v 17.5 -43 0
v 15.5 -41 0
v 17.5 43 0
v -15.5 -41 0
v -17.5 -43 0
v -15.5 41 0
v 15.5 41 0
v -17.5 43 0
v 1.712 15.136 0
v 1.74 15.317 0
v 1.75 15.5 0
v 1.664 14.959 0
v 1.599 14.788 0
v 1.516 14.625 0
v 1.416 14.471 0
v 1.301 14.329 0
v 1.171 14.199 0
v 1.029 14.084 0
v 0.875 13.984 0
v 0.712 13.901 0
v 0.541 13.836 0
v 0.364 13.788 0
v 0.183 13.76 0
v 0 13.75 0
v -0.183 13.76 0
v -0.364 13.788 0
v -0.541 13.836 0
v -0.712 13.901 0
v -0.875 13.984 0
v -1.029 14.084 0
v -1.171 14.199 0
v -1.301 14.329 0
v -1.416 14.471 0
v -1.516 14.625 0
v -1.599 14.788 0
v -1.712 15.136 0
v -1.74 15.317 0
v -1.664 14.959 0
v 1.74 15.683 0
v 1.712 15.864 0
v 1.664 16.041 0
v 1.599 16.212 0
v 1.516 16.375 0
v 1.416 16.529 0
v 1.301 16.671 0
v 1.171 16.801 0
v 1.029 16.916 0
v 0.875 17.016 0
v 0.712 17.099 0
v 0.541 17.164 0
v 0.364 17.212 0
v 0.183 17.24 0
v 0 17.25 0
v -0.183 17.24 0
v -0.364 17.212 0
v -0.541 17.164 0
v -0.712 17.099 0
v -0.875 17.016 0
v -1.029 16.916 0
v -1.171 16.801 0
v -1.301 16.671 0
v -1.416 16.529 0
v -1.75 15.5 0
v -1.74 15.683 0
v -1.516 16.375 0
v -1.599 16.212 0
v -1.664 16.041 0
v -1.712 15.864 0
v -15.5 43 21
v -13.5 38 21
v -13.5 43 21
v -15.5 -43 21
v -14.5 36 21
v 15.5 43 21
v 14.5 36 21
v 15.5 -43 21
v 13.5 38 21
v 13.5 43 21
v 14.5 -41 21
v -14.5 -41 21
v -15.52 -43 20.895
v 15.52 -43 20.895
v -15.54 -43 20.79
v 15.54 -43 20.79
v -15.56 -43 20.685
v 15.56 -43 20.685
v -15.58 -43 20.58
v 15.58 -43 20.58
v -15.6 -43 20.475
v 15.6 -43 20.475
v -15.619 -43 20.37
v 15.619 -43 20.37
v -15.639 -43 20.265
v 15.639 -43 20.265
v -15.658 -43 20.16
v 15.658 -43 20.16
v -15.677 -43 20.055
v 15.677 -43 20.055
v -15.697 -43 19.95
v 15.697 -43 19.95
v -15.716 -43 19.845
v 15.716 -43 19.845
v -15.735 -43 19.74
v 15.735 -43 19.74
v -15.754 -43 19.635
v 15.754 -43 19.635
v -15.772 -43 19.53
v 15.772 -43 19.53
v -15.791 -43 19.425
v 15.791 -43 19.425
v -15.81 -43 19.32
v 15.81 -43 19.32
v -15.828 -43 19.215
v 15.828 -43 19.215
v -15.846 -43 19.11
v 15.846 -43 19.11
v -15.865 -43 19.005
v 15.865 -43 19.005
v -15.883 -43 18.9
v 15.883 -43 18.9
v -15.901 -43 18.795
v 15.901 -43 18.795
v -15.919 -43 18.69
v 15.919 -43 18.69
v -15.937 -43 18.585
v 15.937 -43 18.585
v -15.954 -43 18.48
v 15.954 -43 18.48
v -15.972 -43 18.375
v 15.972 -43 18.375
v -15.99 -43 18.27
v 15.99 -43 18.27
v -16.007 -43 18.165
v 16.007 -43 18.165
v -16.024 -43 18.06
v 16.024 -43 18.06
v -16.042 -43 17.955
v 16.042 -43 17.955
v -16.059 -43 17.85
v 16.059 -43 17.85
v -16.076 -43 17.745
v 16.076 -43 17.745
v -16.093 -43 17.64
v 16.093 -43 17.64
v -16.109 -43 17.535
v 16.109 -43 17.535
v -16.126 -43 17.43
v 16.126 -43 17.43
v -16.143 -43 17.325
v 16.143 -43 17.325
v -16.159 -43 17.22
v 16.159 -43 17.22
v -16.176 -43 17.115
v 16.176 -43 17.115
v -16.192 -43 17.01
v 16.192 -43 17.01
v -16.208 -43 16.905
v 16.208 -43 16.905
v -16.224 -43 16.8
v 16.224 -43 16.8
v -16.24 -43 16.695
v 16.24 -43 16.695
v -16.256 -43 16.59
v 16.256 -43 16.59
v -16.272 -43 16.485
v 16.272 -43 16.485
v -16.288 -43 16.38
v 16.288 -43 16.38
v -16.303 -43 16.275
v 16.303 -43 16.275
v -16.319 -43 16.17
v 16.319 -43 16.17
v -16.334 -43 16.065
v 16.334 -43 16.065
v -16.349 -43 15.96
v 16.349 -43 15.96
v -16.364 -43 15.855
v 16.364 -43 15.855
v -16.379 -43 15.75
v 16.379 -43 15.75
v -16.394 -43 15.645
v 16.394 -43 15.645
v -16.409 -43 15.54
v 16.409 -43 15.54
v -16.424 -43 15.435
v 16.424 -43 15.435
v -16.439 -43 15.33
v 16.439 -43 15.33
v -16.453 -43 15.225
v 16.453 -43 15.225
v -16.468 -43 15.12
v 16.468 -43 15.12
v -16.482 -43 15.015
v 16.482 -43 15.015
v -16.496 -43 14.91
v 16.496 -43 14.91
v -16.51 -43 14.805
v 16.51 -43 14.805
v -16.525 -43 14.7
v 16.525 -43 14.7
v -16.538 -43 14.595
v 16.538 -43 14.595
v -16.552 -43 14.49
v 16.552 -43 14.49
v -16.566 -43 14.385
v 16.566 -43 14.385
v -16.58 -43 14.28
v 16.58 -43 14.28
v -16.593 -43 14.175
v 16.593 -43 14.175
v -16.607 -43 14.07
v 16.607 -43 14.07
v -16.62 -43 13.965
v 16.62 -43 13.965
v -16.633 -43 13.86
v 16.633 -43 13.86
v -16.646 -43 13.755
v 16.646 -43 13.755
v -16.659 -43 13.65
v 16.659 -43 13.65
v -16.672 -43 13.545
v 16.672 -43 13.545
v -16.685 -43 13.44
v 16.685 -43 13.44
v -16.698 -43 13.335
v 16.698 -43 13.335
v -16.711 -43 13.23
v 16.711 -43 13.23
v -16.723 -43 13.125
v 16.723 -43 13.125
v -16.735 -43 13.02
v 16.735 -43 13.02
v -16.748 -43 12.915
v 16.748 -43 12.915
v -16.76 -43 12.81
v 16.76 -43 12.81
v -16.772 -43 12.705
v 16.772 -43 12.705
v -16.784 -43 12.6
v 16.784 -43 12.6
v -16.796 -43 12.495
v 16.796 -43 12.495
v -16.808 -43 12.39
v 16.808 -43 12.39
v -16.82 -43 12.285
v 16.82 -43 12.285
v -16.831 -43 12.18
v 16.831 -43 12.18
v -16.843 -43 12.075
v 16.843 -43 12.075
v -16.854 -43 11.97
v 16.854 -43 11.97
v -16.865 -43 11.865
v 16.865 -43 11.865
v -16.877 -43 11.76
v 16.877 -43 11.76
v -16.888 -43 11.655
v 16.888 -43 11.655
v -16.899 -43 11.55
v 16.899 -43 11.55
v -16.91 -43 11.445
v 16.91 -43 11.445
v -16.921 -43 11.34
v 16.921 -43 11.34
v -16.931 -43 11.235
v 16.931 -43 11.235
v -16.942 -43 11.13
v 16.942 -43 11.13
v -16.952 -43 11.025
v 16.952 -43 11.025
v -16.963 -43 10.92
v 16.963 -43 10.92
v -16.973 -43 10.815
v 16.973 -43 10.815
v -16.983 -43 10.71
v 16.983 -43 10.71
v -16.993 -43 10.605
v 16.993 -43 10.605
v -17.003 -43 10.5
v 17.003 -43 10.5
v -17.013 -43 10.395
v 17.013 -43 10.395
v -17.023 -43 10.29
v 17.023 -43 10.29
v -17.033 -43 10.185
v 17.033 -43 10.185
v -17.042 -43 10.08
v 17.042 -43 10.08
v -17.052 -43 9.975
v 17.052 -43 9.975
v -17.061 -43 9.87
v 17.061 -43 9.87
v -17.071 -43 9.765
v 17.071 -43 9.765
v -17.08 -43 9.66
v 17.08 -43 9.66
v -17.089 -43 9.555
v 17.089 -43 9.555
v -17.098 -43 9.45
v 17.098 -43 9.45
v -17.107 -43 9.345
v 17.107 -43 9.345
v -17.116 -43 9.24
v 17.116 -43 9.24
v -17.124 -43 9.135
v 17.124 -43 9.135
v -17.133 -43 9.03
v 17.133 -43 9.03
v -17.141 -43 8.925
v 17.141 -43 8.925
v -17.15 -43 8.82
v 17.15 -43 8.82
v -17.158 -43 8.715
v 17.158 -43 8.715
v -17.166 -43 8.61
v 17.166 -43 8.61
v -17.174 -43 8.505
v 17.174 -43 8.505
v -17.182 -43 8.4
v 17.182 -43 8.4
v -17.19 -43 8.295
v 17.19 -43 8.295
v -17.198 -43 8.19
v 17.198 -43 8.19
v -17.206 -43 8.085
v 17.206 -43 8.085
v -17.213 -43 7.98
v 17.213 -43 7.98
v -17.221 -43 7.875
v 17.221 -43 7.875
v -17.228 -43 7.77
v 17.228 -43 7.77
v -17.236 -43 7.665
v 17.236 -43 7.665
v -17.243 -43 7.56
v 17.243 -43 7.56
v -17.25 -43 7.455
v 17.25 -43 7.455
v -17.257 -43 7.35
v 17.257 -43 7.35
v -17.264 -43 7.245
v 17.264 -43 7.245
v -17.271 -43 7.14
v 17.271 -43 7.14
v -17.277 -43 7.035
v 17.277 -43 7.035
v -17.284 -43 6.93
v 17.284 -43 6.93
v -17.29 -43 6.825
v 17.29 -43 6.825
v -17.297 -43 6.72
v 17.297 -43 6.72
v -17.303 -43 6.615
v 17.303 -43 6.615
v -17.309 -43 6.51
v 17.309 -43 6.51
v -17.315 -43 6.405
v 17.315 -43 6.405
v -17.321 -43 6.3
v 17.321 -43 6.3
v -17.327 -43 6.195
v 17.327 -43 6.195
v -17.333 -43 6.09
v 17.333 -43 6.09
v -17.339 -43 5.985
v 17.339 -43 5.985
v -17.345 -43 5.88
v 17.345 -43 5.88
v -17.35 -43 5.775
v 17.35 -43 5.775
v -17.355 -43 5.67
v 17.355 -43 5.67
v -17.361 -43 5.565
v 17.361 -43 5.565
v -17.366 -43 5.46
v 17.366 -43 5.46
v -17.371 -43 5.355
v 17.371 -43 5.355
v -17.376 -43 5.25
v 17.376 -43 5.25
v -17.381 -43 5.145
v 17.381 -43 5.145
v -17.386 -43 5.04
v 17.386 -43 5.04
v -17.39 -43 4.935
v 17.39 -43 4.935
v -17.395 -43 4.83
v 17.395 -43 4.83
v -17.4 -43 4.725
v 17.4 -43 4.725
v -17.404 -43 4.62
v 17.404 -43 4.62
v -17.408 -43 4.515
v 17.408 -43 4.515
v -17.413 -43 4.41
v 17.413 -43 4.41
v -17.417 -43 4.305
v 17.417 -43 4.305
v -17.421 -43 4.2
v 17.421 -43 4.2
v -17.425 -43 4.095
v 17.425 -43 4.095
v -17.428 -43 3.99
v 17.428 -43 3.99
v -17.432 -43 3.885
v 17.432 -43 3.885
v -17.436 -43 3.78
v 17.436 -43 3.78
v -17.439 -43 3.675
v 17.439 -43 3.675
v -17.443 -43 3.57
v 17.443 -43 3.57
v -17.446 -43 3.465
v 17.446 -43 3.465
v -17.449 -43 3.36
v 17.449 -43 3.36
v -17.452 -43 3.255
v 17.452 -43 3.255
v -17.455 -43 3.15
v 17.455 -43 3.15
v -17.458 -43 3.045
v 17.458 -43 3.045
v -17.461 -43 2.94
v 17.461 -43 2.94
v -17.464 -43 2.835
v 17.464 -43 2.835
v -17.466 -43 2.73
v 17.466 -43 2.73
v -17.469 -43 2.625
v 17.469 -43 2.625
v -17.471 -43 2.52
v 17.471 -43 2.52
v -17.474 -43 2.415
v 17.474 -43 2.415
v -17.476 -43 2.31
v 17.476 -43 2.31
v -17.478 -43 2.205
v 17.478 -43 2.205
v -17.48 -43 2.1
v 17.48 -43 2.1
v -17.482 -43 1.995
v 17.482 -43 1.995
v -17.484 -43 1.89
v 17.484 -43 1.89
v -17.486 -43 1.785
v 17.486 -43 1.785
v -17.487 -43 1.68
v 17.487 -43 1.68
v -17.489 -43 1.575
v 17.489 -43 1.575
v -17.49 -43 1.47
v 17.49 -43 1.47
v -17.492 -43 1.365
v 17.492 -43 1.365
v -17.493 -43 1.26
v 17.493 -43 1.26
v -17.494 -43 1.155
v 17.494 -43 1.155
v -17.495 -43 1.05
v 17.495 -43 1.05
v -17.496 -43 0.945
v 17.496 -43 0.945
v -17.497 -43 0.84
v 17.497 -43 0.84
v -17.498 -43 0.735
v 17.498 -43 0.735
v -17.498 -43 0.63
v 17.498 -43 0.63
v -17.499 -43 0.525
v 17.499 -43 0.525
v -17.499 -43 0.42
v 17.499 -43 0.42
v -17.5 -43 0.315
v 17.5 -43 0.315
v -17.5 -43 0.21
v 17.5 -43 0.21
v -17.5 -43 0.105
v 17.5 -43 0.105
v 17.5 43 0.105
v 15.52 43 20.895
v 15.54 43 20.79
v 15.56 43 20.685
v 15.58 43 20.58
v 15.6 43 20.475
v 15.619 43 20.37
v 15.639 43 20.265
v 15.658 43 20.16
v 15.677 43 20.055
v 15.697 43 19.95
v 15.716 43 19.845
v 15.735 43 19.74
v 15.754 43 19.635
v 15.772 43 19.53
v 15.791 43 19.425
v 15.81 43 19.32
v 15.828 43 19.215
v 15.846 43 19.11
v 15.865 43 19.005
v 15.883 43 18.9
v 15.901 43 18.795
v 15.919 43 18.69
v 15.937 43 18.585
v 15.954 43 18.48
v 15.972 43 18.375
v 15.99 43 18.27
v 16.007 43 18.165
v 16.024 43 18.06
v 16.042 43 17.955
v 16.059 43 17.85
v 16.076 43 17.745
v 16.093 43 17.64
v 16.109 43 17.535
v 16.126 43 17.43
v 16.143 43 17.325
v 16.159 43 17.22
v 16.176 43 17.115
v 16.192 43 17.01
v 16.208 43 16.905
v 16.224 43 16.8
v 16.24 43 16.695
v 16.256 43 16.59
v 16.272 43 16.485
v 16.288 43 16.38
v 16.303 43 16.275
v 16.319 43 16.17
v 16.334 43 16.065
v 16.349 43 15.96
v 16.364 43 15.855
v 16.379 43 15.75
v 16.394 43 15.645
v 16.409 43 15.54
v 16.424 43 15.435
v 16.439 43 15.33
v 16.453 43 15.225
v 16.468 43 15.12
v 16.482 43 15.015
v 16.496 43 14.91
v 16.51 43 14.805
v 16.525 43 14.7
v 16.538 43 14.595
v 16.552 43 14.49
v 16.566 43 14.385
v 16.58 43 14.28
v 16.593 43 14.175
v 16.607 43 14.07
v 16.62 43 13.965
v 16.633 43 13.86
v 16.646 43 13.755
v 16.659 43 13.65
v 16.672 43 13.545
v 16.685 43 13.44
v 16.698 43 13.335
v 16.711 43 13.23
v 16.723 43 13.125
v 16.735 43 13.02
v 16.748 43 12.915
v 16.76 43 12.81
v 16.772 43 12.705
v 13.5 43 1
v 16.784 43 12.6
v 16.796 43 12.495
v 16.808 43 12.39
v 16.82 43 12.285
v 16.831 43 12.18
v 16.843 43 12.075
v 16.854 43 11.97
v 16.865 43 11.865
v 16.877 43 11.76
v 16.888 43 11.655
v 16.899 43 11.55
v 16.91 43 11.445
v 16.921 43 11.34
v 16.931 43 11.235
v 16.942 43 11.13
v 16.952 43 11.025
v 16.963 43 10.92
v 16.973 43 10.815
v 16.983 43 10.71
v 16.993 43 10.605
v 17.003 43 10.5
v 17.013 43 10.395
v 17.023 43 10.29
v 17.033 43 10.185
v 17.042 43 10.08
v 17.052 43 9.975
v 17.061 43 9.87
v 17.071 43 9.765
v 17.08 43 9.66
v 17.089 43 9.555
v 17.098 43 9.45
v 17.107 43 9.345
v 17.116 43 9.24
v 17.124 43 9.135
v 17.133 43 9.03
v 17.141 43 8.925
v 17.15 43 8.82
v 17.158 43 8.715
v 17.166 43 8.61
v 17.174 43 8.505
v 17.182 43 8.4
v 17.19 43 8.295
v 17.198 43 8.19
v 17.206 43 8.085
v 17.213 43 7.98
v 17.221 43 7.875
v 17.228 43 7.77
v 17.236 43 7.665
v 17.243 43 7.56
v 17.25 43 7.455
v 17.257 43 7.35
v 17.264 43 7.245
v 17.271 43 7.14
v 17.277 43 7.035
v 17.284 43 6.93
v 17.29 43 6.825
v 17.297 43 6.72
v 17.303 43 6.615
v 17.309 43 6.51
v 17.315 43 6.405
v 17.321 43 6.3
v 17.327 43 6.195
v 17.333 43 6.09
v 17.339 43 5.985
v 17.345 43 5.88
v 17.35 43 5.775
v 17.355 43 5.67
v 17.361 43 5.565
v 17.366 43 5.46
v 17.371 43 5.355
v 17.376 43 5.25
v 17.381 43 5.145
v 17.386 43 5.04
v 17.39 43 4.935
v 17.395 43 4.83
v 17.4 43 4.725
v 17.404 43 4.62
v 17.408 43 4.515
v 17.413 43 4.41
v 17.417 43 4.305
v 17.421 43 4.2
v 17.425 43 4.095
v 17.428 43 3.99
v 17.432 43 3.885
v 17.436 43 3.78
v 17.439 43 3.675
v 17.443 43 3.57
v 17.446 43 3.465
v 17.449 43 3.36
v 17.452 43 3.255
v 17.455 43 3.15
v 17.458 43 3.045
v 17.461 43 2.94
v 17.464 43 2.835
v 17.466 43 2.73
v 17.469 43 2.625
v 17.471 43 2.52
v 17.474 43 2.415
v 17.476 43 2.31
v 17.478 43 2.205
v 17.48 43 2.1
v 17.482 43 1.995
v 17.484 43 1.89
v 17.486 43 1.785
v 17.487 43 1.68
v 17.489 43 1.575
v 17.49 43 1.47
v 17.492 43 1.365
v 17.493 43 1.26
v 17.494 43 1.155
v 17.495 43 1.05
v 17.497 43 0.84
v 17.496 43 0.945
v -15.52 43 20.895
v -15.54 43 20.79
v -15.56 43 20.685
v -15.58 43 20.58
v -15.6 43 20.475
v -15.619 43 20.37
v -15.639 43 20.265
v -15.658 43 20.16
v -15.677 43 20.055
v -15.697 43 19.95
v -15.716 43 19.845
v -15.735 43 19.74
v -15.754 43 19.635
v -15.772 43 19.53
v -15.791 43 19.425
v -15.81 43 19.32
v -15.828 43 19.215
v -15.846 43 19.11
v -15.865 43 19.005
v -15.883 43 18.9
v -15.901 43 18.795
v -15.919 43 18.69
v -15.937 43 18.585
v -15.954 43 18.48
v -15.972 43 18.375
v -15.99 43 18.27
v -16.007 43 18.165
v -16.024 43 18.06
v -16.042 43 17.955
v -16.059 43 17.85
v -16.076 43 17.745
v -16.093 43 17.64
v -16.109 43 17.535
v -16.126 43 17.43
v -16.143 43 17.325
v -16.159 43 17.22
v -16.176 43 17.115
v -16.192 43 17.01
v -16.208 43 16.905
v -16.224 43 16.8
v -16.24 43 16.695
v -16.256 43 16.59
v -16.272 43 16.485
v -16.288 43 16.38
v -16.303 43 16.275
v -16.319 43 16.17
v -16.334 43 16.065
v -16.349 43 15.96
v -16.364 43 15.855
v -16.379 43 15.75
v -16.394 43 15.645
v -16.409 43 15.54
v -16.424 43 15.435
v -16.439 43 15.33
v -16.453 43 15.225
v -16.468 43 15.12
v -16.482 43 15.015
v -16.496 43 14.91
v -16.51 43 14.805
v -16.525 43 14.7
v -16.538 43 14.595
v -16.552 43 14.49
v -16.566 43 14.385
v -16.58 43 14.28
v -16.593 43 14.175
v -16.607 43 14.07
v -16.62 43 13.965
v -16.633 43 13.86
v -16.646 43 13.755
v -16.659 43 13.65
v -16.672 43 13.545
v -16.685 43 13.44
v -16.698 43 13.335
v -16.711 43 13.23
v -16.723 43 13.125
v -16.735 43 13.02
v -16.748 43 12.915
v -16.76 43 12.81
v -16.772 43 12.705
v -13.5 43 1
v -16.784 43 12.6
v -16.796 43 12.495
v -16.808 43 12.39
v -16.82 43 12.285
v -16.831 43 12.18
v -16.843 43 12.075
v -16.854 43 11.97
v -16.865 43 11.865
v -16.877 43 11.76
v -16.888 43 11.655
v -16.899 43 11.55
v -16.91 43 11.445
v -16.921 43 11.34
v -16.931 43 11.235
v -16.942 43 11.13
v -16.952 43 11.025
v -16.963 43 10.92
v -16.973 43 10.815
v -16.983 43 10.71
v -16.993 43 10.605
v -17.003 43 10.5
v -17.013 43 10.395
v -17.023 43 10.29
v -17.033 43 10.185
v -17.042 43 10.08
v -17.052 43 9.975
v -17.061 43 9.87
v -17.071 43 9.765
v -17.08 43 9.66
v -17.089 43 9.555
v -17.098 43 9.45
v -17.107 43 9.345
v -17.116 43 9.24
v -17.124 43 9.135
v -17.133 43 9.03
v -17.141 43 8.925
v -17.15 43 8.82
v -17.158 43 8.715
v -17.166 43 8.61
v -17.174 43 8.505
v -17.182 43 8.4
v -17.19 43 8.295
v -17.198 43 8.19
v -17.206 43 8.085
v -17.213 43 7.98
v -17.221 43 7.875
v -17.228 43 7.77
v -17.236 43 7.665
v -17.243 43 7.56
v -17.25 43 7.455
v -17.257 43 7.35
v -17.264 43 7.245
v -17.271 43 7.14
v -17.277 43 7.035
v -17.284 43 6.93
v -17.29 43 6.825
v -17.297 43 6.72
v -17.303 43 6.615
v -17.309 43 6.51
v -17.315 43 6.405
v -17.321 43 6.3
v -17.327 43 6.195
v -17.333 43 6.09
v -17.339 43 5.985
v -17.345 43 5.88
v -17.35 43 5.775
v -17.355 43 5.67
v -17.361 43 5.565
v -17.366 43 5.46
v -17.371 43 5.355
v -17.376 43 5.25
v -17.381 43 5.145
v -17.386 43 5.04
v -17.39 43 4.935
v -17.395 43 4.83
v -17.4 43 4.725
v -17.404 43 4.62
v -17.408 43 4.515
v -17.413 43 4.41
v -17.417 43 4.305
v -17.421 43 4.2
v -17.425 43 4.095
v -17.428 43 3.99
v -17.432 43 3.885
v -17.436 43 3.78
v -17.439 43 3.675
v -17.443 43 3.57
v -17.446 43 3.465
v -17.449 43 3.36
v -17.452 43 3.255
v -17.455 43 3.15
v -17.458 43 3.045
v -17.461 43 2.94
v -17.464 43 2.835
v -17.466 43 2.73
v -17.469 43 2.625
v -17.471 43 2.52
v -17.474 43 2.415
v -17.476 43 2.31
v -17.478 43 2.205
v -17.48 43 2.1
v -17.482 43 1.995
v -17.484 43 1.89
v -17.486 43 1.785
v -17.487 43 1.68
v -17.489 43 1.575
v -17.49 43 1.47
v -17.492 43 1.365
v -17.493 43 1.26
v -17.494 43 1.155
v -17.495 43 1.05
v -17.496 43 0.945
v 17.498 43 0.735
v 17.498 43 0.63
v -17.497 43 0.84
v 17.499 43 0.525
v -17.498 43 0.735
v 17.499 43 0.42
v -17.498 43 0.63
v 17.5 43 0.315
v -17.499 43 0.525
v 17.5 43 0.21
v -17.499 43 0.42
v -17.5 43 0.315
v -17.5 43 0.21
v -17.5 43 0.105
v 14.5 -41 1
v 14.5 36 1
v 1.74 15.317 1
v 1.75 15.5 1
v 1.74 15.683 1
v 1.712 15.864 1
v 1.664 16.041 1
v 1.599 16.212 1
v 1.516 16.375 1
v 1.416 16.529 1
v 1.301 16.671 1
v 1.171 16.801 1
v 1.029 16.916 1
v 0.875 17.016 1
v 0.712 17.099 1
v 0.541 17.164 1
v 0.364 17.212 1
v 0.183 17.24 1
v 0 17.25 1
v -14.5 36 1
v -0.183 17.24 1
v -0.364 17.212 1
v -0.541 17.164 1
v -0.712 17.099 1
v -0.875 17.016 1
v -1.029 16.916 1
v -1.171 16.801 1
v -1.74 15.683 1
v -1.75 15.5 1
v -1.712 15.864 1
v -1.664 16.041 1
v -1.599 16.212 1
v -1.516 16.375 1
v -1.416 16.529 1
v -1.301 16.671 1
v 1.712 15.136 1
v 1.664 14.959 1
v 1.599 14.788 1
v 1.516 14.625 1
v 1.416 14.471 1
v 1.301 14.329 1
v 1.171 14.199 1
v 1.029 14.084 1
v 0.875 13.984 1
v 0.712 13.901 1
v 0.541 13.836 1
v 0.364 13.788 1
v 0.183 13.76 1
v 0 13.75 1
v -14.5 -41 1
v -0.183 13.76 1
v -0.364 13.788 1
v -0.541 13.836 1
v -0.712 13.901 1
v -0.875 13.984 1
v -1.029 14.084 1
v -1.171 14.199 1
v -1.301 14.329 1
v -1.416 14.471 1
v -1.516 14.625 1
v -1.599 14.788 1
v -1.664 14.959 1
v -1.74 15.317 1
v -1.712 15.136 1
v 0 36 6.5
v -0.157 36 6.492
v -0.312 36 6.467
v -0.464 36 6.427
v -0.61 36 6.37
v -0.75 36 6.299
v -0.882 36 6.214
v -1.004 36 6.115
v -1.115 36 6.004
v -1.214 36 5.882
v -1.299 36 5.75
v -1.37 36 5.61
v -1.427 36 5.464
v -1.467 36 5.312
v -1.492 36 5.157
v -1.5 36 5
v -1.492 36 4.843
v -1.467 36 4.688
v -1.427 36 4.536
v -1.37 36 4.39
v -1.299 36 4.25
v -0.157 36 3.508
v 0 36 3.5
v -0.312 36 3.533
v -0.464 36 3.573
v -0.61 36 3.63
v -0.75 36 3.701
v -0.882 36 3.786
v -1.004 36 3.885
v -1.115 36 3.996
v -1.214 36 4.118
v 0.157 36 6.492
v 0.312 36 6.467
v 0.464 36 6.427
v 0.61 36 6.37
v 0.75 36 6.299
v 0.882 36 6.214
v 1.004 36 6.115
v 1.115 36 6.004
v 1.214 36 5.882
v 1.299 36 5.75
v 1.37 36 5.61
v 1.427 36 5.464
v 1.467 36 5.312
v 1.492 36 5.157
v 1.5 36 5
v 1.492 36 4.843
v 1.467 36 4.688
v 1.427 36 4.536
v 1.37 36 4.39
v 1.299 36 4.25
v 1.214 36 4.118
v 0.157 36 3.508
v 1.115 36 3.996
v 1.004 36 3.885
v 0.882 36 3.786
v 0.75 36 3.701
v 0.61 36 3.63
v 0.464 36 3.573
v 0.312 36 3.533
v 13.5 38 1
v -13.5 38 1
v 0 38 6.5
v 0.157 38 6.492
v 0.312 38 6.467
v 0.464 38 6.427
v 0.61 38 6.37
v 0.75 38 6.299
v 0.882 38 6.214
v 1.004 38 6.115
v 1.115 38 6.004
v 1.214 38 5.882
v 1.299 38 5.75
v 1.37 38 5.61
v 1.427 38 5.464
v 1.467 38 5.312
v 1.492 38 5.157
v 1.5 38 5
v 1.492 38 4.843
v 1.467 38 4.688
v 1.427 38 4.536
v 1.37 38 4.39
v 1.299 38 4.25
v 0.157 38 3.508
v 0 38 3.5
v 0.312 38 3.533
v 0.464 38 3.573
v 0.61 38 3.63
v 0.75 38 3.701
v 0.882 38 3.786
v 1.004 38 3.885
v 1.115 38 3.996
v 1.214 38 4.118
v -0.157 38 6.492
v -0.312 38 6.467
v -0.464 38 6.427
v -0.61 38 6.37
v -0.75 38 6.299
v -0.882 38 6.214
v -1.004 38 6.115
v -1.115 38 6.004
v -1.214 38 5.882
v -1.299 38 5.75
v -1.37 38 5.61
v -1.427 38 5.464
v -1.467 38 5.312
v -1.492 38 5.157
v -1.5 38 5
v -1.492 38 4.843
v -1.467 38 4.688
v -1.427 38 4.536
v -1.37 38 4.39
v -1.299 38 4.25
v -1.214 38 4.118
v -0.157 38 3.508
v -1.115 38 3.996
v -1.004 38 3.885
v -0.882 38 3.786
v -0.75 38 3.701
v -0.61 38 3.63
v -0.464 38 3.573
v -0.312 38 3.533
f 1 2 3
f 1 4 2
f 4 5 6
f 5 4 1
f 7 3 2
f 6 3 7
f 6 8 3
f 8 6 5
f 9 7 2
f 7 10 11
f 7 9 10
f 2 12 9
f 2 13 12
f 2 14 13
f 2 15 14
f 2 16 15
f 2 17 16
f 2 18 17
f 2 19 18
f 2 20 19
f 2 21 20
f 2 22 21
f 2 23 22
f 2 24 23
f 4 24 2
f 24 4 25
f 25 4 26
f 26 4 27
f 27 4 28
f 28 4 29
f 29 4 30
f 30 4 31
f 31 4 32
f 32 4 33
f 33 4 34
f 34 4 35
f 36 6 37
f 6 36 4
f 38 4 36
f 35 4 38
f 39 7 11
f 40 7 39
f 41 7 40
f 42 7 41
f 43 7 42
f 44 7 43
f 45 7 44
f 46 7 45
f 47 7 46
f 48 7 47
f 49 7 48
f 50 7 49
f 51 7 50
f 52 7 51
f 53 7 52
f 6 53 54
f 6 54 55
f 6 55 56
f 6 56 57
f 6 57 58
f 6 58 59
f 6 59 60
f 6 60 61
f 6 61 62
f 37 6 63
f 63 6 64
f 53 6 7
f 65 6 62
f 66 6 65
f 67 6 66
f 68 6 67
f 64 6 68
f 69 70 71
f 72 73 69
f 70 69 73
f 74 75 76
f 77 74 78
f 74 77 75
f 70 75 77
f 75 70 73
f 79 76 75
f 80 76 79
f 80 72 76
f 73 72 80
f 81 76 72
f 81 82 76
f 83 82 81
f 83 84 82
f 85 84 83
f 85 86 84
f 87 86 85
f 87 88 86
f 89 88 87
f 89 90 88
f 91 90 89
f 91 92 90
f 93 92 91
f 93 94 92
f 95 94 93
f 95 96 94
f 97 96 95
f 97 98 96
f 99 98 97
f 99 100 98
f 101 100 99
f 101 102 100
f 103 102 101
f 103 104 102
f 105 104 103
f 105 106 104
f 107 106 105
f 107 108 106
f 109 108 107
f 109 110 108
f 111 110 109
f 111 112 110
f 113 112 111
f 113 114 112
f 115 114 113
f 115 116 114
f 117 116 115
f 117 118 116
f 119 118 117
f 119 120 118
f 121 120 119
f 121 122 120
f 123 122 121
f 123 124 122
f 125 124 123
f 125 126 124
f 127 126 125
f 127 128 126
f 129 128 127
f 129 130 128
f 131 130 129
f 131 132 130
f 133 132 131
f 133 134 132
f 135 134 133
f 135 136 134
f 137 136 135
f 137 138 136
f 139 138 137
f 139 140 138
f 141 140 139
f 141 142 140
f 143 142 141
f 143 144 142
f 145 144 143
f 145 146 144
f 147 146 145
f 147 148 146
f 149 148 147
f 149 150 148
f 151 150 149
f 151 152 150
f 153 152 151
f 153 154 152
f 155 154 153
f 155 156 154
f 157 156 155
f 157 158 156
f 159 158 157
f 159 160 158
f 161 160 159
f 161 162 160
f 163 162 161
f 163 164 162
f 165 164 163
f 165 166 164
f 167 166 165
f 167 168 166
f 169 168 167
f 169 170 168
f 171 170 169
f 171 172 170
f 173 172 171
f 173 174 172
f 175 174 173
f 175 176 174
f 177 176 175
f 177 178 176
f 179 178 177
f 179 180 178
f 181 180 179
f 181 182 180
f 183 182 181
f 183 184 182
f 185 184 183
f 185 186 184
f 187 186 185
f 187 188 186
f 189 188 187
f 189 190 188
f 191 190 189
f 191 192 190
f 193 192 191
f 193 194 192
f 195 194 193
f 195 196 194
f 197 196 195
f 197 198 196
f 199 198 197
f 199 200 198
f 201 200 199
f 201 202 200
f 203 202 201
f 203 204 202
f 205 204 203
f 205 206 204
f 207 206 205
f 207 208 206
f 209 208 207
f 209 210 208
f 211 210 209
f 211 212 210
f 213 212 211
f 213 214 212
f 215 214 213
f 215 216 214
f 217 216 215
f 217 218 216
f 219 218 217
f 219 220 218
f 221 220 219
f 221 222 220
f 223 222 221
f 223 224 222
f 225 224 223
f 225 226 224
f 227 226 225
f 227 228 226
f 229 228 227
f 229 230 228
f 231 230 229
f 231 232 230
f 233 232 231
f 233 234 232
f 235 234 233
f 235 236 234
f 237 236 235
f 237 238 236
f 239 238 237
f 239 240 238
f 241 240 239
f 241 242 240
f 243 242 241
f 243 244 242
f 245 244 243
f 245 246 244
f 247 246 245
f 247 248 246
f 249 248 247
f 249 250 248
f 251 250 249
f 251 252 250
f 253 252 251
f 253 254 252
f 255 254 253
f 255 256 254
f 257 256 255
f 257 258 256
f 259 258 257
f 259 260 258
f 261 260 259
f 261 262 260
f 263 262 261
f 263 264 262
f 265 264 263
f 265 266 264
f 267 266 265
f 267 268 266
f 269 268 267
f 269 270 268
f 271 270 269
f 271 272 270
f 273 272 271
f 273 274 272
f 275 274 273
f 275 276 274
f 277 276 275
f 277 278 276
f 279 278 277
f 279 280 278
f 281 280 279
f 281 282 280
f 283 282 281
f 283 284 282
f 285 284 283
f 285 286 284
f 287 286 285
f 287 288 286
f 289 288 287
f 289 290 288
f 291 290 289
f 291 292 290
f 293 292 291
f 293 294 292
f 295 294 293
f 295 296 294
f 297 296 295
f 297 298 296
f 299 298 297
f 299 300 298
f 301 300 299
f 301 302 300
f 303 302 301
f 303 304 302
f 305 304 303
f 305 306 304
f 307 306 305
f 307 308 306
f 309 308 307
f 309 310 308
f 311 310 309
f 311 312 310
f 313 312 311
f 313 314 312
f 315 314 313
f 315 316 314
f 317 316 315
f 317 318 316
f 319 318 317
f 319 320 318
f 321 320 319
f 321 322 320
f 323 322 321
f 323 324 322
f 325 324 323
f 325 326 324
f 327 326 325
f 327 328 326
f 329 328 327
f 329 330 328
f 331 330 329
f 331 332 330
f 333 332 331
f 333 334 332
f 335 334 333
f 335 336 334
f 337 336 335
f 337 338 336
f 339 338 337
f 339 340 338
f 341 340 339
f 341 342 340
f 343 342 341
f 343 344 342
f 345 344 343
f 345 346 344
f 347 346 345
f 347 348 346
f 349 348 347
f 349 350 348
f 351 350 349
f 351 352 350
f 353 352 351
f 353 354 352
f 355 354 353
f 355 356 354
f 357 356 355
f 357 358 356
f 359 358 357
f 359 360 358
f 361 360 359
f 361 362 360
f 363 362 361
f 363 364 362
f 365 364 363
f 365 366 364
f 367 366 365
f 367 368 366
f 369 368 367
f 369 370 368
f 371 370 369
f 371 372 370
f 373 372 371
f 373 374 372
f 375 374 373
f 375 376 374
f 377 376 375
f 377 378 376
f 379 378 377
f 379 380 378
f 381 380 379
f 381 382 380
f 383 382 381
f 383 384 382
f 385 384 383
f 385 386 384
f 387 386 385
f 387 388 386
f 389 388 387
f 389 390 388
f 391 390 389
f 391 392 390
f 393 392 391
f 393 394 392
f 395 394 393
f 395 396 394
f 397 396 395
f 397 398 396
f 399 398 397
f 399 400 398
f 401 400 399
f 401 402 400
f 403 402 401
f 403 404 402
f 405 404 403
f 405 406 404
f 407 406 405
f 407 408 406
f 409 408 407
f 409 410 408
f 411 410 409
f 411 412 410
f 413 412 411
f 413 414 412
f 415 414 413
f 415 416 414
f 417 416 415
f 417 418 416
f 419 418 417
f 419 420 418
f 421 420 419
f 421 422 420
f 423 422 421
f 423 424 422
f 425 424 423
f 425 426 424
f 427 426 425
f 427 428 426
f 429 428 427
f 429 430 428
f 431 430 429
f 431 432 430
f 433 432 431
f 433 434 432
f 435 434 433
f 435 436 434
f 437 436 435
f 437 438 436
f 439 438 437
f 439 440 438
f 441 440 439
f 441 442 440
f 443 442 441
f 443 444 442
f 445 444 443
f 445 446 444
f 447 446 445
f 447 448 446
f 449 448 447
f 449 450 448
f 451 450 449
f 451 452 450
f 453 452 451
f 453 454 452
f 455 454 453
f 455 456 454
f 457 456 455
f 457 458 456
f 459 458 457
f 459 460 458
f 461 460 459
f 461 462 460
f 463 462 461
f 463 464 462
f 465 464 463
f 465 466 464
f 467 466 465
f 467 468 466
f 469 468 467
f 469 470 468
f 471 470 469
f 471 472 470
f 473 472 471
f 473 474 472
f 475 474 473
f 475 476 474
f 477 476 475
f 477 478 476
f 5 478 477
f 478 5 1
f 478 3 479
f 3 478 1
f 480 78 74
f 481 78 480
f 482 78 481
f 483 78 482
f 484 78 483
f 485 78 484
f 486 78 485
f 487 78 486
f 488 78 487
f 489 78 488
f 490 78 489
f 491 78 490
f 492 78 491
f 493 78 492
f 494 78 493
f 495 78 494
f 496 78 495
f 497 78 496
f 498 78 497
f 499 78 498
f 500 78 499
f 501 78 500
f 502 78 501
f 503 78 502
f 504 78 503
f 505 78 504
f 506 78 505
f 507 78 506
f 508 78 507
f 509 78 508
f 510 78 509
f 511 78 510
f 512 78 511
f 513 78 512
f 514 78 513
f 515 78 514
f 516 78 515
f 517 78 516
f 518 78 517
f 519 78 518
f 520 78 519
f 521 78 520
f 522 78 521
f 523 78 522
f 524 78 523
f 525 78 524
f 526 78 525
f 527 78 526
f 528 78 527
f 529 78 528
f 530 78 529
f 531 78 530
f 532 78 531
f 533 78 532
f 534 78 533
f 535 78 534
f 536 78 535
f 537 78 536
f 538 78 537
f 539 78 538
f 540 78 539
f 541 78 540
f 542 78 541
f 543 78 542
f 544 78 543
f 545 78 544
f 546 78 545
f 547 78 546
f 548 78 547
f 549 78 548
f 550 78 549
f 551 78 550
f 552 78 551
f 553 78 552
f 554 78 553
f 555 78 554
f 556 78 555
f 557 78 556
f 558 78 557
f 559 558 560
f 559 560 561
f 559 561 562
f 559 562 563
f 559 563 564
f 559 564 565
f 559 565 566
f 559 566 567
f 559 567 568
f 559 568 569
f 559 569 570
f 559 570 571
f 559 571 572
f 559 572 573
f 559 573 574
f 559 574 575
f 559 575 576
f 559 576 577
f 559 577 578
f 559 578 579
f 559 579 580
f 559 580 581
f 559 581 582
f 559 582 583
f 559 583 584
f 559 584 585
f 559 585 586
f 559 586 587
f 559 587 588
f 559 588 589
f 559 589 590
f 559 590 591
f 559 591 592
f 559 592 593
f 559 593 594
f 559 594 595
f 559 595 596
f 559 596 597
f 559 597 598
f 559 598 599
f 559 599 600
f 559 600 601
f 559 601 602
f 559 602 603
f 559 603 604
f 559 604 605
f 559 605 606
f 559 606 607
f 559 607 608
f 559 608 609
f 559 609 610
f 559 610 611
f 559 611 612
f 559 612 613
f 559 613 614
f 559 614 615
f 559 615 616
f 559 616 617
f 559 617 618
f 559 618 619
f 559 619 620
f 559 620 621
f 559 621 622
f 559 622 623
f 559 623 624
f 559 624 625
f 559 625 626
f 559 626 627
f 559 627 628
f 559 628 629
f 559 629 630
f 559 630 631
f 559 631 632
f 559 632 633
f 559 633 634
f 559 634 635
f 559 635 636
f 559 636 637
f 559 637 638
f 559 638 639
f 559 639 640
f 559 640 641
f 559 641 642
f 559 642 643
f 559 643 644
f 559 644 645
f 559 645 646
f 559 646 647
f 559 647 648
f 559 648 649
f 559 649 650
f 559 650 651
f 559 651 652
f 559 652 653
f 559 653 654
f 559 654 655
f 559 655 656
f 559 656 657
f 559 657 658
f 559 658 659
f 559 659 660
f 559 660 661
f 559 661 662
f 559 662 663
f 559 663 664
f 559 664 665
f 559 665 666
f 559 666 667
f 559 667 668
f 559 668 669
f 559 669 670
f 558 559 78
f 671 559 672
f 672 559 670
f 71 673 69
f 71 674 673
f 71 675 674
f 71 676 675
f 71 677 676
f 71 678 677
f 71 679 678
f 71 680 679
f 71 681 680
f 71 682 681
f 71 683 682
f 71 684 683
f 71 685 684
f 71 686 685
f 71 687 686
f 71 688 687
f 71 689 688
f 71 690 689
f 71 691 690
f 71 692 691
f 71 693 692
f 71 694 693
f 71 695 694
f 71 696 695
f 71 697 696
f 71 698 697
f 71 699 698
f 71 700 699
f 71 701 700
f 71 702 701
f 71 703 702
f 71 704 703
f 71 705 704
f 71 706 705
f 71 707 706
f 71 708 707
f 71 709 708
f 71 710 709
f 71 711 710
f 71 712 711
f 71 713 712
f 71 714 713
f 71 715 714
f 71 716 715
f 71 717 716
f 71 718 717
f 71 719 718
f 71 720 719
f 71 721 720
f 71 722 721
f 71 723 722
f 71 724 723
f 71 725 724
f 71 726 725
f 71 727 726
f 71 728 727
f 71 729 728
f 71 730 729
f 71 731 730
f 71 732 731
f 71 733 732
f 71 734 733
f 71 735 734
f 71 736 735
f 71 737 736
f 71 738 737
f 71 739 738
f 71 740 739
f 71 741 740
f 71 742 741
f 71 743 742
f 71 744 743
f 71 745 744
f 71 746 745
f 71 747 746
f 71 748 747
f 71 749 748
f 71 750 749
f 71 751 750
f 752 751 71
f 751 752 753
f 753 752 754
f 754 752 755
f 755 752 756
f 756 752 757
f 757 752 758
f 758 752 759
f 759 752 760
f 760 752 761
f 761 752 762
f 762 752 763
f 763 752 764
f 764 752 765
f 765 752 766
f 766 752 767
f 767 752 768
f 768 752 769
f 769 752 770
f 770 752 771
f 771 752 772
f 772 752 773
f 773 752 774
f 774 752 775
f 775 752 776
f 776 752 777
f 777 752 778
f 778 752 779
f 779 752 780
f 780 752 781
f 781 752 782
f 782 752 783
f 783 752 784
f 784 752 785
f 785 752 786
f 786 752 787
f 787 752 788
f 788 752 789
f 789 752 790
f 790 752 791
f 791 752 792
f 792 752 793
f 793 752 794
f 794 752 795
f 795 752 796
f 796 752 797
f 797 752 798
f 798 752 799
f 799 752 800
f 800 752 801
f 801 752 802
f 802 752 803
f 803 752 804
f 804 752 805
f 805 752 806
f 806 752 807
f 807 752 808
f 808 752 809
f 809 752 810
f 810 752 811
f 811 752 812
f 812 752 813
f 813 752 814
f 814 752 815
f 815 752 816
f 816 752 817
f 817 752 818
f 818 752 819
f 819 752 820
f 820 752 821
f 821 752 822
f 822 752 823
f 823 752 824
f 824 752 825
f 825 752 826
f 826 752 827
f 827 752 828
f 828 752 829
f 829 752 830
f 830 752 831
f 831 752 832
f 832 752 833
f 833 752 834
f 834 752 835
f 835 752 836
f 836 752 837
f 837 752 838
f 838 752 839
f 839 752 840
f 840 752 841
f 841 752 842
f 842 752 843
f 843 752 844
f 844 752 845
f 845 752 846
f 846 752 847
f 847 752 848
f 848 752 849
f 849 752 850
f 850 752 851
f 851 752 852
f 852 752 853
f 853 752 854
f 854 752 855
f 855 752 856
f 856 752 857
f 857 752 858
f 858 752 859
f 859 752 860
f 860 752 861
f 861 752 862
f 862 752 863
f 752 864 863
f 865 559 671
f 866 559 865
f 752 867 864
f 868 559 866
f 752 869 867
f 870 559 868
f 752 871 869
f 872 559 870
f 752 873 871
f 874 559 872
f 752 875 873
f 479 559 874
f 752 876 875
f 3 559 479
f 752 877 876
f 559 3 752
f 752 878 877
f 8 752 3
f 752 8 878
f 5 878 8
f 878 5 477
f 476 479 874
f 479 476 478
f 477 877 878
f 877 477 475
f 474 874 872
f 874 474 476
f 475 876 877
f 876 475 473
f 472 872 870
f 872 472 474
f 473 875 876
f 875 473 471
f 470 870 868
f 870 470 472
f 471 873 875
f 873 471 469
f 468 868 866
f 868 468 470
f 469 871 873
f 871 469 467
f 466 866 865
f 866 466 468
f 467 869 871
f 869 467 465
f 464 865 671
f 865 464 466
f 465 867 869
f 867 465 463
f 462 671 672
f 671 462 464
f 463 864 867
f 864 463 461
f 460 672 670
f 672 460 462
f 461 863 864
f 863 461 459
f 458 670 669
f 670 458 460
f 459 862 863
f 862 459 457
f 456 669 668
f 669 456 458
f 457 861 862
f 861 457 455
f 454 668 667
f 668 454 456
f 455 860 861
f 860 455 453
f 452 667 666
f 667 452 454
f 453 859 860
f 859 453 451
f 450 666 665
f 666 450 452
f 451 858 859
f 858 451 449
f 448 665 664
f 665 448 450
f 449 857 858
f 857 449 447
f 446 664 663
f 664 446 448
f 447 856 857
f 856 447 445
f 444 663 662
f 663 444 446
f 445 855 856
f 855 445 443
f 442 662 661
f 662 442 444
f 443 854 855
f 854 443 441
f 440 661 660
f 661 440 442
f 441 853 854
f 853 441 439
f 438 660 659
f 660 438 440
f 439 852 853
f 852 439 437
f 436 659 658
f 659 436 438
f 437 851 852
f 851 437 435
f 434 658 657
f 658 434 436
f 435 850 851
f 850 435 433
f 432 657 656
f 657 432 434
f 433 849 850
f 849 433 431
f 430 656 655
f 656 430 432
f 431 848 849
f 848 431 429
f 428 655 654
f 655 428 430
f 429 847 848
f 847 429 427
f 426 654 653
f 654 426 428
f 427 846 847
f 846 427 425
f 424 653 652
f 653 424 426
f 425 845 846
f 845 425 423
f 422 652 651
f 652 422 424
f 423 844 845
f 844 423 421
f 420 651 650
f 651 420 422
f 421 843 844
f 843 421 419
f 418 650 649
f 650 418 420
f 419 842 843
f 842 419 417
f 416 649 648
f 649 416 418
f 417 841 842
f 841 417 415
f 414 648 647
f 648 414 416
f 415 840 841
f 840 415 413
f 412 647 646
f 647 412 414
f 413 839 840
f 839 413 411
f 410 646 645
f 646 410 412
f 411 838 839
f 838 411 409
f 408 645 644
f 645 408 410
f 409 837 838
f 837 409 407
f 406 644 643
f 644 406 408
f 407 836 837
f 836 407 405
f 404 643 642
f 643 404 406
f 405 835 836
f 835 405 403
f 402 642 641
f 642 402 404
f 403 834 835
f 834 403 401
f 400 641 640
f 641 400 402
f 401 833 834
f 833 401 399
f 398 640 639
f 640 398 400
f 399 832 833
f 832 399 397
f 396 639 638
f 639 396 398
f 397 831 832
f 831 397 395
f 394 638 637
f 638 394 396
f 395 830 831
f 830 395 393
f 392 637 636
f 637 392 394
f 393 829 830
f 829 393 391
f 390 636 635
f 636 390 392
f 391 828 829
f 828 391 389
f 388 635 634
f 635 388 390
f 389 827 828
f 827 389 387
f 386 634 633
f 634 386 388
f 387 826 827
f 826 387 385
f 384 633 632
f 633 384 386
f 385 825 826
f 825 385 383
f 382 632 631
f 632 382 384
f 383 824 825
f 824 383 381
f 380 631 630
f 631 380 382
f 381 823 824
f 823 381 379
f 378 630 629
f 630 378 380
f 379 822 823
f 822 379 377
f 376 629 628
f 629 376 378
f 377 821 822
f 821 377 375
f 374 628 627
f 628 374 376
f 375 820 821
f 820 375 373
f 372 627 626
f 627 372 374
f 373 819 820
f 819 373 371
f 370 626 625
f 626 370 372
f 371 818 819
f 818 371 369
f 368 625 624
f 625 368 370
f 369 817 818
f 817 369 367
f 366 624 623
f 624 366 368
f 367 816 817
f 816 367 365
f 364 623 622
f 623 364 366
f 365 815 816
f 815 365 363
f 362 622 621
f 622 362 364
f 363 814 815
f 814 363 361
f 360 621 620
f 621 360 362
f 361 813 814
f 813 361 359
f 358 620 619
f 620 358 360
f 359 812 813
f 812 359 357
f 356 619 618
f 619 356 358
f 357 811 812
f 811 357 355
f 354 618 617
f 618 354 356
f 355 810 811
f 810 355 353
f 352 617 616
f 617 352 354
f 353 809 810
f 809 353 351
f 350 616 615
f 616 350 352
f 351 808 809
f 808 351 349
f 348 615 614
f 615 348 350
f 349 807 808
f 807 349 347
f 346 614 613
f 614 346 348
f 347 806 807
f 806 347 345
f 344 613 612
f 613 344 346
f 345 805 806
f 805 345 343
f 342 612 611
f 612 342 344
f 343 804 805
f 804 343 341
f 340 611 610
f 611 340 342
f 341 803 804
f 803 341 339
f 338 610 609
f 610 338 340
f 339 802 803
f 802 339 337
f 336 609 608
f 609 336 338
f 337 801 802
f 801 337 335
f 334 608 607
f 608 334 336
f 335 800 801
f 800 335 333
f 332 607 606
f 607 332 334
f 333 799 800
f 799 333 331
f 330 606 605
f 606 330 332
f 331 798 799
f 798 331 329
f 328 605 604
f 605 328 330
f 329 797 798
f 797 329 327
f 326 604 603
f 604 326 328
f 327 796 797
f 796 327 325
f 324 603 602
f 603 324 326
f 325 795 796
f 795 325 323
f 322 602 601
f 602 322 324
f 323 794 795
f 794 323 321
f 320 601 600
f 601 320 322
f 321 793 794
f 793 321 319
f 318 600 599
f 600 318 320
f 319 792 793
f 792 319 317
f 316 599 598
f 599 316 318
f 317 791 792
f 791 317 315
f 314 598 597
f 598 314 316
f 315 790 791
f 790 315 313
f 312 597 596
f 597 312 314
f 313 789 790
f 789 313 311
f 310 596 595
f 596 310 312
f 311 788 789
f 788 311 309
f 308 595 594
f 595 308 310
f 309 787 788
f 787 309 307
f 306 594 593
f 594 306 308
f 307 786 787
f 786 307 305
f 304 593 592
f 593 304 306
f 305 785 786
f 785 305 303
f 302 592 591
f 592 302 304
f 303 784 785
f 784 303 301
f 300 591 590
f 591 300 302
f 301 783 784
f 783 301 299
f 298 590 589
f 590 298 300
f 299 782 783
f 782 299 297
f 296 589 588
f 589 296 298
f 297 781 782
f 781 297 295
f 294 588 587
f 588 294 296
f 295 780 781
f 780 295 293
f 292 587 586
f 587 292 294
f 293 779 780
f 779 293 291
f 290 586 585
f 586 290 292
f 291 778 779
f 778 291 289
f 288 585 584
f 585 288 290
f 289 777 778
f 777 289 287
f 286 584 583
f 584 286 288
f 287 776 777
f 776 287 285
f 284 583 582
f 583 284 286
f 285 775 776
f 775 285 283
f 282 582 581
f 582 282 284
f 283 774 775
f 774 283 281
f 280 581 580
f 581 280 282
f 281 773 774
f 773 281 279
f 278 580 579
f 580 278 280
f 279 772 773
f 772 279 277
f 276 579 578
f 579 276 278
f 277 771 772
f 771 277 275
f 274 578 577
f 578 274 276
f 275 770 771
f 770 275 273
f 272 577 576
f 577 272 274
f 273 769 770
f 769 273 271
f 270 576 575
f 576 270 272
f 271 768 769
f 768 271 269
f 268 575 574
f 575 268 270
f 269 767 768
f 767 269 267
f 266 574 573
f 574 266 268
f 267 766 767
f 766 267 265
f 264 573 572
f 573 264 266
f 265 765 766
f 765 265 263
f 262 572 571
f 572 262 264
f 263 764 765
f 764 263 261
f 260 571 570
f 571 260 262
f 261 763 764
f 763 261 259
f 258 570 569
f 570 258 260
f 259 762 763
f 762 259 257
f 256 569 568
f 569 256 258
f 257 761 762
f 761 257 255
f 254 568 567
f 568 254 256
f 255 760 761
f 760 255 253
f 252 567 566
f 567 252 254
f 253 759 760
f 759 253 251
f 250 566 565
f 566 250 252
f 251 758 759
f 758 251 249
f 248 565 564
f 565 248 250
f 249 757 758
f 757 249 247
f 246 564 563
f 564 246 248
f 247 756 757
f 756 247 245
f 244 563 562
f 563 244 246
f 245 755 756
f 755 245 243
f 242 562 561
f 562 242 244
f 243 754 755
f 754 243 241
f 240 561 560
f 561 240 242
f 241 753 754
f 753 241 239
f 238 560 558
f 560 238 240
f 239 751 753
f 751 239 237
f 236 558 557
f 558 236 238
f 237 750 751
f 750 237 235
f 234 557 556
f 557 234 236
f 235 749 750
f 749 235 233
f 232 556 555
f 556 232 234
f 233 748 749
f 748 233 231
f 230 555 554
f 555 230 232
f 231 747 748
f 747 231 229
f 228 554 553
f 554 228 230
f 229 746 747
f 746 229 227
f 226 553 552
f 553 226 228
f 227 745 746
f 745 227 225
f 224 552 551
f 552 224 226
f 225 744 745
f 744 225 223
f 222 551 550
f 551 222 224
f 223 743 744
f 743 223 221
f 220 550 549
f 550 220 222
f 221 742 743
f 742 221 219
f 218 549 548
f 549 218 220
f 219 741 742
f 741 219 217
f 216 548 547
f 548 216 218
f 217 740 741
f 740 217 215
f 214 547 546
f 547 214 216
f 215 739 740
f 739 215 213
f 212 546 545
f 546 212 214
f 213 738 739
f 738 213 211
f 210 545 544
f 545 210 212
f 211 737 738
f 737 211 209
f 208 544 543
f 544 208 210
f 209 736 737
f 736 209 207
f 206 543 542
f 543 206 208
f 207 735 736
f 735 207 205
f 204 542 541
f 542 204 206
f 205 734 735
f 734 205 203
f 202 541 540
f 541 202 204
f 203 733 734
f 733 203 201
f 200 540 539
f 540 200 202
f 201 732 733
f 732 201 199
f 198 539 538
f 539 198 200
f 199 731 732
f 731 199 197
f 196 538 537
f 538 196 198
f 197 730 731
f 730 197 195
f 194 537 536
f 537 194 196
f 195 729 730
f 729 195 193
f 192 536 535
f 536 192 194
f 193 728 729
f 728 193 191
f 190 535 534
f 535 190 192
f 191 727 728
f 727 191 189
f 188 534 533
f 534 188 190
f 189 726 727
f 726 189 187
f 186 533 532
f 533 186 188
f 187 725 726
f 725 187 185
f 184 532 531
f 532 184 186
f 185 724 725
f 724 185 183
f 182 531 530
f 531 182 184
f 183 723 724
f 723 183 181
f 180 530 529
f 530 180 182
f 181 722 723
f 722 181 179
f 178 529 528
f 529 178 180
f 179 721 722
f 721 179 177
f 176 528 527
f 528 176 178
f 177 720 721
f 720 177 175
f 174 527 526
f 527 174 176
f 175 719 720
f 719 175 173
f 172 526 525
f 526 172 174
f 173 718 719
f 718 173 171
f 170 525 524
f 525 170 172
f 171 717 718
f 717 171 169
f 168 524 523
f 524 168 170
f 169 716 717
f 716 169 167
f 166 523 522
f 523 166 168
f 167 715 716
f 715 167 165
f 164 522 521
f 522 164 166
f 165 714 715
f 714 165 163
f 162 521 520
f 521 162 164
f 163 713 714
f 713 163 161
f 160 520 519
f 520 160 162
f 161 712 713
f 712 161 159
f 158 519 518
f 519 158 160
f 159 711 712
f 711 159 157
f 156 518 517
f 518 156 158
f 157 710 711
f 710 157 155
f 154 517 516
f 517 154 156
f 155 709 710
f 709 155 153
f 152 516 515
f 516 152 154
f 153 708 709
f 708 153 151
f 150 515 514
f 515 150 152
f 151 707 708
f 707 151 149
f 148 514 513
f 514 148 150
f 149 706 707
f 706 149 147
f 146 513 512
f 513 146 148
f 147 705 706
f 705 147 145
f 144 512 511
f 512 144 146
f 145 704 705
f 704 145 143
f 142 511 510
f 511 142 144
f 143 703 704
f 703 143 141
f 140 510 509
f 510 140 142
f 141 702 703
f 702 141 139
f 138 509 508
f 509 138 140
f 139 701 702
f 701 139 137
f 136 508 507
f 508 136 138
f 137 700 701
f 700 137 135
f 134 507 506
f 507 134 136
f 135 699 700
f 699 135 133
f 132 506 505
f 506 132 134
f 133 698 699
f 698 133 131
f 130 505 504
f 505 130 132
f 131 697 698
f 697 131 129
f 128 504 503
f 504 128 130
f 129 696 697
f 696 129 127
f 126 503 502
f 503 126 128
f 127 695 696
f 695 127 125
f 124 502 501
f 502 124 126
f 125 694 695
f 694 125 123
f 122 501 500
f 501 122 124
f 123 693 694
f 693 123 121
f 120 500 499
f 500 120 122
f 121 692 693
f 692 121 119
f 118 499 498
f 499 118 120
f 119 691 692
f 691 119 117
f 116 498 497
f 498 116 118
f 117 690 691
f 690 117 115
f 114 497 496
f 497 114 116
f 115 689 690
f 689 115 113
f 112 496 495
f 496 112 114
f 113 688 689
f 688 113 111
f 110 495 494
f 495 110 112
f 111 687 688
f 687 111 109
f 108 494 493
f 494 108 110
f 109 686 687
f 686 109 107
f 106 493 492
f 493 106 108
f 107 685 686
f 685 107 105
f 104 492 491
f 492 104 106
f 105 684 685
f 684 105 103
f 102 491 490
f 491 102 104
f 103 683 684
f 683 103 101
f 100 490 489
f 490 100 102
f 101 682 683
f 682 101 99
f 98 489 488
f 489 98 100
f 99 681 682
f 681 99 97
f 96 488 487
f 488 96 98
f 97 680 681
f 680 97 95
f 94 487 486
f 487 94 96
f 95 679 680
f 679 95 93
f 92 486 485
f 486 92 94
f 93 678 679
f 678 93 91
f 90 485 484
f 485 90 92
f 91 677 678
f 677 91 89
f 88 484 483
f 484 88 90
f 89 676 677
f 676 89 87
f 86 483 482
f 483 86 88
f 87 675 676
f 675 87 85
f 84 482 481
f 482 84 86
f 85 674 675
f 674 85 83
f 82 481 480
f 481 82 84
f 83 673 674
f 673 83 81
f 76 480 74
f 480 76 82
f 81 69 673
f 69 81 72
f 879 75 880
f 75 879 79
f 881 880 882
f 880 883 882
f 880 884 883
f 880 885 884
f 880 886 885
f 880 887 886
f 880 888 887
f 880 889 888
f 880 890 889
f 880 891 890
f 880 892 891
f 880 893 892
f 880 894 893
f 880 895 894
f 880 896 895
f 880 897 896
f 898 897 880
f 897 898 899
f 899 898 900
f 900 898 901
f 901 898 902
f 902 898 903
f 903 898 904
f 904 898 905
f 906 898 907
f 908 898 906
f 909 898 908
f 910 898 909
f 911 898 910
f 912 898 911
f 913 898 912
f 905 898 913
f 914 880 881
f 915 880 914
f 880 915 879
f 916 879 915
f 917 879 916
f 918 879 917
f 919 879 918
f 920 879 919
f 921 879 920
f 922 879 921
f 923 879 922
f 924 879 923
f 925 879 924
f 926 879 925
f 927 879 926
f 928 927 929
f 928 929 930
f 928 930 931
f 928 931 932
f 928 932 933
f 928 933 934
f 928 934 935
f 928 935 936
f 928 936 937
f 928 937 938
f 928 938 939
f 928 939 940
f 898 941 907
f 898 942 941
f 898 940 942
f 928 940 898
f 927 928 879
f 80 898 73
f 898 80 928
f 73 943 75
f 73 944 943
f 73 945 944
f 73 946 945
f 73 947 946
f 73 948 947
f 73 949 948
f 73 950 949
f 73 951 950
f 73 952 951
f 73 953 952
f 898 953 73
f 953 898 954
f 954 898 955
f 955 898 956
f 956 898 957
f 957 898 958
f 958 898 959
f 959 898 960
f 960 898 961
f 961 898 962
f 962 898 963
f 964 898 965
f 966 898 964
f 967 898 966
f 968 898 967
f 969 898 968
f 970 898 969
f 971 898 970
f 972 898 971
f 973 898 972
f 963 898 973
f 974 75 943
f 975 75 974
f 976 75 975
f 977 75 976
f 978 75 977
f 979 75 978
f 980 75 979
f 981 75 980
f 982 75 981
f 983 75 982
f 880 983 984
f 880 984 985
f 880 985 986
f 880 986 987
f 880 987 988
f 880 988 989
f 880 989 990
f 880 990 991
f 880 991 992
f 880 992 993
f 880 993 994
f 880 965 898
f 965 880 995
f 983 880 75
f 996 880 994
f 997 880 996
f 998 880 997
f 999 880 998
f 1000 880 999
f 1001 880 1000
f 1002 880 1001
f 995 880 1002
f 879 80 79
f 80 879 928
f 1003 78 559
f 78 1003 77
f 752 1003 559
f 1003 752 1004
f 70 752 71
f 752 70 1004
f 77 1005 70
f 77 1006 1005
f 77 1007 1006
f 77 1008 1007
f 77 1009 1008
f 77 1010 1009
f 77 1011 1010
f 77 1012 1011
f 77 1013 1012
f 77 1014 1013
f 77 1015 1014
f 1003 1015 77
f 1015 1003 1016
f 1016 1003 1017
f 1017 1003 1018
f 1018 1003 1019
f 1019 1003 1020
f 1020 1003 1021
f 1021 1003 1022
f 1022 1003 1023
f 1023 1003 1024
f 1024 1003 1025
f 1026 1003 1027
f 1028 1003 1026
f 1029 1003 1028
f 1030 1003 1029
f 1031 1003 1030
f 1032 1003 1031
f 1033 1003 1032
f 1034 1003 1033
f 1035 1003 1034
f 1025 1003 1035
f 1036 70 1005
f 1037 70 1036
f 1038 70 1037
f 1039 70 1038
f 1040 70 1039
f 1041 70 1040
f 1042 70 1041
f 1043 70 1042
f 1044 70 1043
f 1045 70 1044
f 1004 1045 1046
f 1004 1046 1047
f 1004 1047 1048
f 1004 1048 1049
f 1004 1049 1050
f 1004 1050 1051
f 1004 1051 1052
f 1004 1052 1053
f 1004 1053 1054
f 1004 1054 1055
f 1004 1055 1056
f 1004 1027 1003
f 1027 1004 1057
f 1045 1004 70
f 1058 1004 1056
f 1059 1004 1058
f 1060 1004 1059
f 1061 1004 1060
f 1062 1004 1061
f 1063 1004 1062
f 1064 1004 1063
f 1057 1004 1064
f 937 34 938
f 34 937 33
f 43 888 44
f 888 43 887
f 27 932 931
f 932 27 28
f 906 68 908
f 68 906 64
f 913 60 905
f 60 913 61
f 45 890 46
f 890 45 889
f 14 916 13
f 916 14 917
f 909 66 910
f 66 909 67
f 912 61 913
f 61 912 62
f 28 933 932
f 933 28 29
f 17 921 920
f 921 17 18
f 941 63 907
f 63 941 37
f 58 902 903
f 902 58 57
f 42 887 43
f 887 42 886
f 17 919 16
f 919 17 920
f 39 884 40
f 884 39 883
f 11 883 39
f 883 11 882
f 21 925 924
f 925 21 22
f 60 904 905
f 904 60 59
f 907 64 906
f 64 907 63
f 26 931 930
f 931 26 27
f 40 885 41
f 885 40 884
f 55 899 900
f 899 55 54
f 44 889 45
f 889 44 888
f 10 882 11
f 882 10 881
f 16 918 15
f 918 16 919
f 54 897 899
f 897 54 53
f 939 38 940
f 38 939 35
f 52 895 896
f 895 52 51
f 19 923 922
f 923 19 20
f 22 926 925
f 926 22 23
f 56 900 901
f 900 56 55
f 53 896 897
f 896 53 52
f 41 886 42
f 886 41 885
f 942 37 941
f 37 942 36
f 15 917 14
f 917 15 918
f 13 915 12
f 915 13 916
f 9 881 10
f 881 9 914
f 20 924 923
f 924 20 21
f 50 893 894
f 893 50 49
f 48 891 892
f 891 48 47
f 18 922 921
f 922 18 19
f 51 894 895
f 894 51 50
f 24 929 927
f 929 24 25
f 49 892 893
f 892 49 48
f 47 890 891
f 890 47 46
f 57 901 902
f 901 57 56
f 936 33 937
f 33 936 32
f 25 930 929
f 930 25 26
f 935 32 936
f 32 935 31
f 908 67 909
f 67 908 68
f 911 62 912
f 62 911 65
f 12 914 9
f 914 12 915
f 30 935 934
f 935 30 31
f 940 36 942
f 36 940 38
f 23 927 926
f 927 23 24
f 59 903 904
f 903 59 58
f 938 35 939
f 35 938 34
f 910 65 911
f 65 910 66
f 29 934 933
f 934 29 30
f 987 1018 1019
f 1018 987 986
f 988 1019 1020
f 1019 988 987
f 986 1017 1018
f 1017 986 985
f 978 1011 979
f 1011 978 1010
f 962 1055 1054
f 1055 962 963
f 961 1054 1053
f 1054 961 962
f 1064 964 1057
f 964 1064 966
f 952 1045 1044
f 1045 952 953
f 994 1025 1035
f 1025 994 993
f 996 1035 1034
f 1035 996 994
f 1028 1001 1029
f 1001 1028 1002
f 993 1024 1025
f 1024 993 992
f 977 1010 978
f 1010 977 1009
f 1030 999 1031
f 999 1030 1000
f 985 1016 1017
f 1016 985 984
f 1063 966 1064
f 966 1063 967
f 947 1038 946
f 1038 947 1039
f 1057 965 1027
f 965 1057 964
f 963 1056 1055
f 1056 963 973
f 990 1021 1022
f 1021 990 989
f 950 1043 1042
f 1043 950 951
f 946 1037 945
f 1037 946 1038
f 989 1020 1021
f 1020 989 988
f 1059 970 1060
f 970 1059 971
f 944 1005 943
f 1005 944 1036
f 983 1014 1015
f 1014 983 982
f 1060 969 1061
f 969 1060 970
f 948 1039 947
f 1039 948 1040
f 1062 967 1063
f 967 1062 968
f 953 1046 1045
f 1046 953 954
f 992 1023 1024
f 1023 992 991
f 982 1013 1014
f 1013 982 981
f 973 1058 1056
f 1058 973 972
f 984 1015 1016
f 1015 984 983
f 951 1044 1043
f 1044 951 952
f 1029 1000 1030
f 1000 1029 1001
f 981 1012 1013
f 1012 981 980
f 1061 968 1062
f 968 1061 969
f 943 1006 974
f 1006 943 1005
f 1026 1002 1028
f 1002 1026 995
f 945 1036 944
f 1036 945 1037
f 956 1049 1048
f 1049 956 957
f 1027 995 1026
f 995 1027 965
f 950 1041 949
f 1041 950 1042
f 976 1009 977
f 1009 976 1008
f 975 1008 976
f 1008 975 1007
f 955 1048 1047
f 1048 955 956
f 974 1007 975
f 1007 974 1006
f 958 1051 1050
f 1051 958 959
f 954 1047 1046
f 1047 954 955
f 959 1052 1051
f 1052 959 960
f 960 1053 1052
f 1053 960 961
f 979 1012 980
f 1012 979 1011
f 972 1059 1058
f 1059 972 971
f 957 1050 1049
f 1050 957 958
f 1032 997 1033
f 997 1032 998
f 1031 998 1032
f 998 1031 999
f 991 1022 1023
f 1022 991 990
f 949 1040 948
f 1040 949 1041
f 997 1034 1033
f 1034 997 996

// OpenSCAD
// Tapered Box with bottom lip, mezzanine floor, and hole
//
// Structure from z=0 upward:
//   [0 → lip_height]                     LIP ZONE (picture-frame outer wall only)
//   [lip_height → lip_height+mezz_thick]  MEZZANINE FLOOR (solid, 3mm thick)
//   [lip_height+mezz_thick → box_height]  MAIN CAVITY (open)
//
//   Bottom width : 35 mm
//   Top width    : 31 mm
//   Length       : 86 mm  (runs along Y; front = +Y)
//   Height       : 20 mm
//   Wall         : 2  mm
//   Lip height   : 5  mm
//   Mezz thick   : 3  mm
//
//   Mezzanine hole: 3mm dia, centred on X, 27.5mm from front face (+Y side)

bottom_width = 35;
top_width    = 31;
box_length   = 86;
box_height   = 26-5;
wall         = 2.0;
lip_height   = 0.0;
mezz_thick   = 1.0;

hole_d = 3.5;
hole_y = box_length/2 - 27.5;   // 43 - 27.5 = 15.5 mm from centre toward front
hole_x = 0;

steps = 2000;
$fn   = 60;

// ---------------------------------------------------------------------------
// Arc helpers
// ---------------------------------------------------------------------------
function arc_R(hw0, hw1, H)  = -(H*H + (hw1-hw0)*(hw1-hw0)) / (2*(hw1-hw0));
function arc_wc(hw0, R)      = hw0 - R;
function arc_w(z, R, wc)     = 2 * (wc + sqrt(max(0, R*R - z*z)));

o_R  = arc_R( bottom_width/2,        top_width/2,        box_height);
o_wc = arc_wc(bottom_width/2, o_R);

i_R  = arc_R( bottom_width/2 - wall, top_width/2 - wall, box_height);
i_wc = arc_wc(bottom_width/2 - wall, i_R);

// ---------------------------------------------------------------------------
// Lofted rectangular polyhedron
// ---------------------------------------------------------------------------
module lofted_rect(w_R, w_wc, z_offset, len, h, n=200) {
    pts = [
        for (i = [0:n])
        let(z_abs = z_offset + i*h/n)
        for (c = [[-1,-1],[1,-1],[1,1],[-1,1]])
            [c[0] * arc_w(z_abs, w_R, w_wc) / 2,
             c[1] * len / 2,
             i * h / n]
    ];
    bot   = [3,2,1,0];
    tb    = n*4;
    top_f = [tb, tb+1, tb+2, tb+3];
    sides = [
        for (i = [0:n-1])
        for (s = [0:3])
        let(a=i*4+s, b=i*4+(s+1)%4, c=(i+1)*4+(s+1)%4, dd=(i+1)*4+s)
        [a,b,c,dd]
    ];
    polyhedron(points=pts, faces=concat([bot],[top_f],sides), convexity=10);
}

// ---------------------------------------------------------------------------
// Assembly
// ---------------------------------------------------------------------------
internalZOffset = lip_height + mezz_thick;
roofRecess = 5.0;


difference() {
    // Full outer solid
    lofted_rect(o_R, o_wc, 0, box_length, box_height);

    // Lip void: hollow interior from z=0 to z=lip_height (leaves outer wall ring)
    lofted_rect(i_R, i_wc, 0, box_length - 2*wall, lip_height);
    
    translate([-(top_width-wall)/2, -(box_length/2-wall), internalZOffset]) {
        cube([top_width-wall, box_length-wall*2-roofRecess, box_height-        internalZOffset],center=false);
    }
    
    coalHatchWidth = top_width - wall*2;
    translate([-coalHatchWidth/2, box_length/2 - roofRecess, internalZOffset]) {
        cube([coalHatchWidth, 10, box_height-internalZOffset],center=false);
    }

    // Mezzanine hole: 3mm dia, through full mezz floor thickness
    // 27.5mm from front face (most positive Y = +box_length/2)
    translate([hole_x, hole_y, lip_height - 0.1])
    cylinder(d=hole_d, h=mezz_thick + 0.2, $fn=60);
    
    translate([0, 50, 5])
    {
        rotate([90, 0, 0]){
            cylinder(d=3, h=20 + 0.2, $fn=60);
        }
    }
}

/*
clyDia = 110;
rotate([90, 0, 180]) {
    translate([0, -27, box_length/2 - roofRecess - wall]){
        difference() {
            cylinder(d=clyDia,h=roofRecess+wall,$fn=60);
            
            translate([0, 0, wall]){
                cylinder(d=clyDia-2,h=roofRecess+wall,$fn=60);
            }
            
            translate([0, -210, 0]){
                cube([1000, 500, 20],center=true);
            }
            
            blankingBoxLen = 50;
            translate([top_width/2 + blankingBoxLen/2, box_length/2, 0]){
                    cube([blankingBoxLen, 20, box_height*10],center=true);
                }
            rotate([0, 180, 0])
            {
                translate([top_width/2 + blankingBoxLen/2, box_length/2, 0]){
                    cube([blankingBoxLen, 20, box_height*10],center=true);
                }
            }
        }
    }
}
*/







// ---------------------------------------------------------------------------
// Info
// ---------------------------------------------------------------------------
echo("Lip void height     :", lip_height, "mm");
echo("Mezzanine floor     :", lip_height, "to", lip_height + mezz_thick, "mm");
echo("Main cavity         :", lip_height + mezz_thick, "to", box_height, "mm");
echo("Hole centre Y       :", hole_y, "mm from box centre (=", 27.5, "mm from front)");
